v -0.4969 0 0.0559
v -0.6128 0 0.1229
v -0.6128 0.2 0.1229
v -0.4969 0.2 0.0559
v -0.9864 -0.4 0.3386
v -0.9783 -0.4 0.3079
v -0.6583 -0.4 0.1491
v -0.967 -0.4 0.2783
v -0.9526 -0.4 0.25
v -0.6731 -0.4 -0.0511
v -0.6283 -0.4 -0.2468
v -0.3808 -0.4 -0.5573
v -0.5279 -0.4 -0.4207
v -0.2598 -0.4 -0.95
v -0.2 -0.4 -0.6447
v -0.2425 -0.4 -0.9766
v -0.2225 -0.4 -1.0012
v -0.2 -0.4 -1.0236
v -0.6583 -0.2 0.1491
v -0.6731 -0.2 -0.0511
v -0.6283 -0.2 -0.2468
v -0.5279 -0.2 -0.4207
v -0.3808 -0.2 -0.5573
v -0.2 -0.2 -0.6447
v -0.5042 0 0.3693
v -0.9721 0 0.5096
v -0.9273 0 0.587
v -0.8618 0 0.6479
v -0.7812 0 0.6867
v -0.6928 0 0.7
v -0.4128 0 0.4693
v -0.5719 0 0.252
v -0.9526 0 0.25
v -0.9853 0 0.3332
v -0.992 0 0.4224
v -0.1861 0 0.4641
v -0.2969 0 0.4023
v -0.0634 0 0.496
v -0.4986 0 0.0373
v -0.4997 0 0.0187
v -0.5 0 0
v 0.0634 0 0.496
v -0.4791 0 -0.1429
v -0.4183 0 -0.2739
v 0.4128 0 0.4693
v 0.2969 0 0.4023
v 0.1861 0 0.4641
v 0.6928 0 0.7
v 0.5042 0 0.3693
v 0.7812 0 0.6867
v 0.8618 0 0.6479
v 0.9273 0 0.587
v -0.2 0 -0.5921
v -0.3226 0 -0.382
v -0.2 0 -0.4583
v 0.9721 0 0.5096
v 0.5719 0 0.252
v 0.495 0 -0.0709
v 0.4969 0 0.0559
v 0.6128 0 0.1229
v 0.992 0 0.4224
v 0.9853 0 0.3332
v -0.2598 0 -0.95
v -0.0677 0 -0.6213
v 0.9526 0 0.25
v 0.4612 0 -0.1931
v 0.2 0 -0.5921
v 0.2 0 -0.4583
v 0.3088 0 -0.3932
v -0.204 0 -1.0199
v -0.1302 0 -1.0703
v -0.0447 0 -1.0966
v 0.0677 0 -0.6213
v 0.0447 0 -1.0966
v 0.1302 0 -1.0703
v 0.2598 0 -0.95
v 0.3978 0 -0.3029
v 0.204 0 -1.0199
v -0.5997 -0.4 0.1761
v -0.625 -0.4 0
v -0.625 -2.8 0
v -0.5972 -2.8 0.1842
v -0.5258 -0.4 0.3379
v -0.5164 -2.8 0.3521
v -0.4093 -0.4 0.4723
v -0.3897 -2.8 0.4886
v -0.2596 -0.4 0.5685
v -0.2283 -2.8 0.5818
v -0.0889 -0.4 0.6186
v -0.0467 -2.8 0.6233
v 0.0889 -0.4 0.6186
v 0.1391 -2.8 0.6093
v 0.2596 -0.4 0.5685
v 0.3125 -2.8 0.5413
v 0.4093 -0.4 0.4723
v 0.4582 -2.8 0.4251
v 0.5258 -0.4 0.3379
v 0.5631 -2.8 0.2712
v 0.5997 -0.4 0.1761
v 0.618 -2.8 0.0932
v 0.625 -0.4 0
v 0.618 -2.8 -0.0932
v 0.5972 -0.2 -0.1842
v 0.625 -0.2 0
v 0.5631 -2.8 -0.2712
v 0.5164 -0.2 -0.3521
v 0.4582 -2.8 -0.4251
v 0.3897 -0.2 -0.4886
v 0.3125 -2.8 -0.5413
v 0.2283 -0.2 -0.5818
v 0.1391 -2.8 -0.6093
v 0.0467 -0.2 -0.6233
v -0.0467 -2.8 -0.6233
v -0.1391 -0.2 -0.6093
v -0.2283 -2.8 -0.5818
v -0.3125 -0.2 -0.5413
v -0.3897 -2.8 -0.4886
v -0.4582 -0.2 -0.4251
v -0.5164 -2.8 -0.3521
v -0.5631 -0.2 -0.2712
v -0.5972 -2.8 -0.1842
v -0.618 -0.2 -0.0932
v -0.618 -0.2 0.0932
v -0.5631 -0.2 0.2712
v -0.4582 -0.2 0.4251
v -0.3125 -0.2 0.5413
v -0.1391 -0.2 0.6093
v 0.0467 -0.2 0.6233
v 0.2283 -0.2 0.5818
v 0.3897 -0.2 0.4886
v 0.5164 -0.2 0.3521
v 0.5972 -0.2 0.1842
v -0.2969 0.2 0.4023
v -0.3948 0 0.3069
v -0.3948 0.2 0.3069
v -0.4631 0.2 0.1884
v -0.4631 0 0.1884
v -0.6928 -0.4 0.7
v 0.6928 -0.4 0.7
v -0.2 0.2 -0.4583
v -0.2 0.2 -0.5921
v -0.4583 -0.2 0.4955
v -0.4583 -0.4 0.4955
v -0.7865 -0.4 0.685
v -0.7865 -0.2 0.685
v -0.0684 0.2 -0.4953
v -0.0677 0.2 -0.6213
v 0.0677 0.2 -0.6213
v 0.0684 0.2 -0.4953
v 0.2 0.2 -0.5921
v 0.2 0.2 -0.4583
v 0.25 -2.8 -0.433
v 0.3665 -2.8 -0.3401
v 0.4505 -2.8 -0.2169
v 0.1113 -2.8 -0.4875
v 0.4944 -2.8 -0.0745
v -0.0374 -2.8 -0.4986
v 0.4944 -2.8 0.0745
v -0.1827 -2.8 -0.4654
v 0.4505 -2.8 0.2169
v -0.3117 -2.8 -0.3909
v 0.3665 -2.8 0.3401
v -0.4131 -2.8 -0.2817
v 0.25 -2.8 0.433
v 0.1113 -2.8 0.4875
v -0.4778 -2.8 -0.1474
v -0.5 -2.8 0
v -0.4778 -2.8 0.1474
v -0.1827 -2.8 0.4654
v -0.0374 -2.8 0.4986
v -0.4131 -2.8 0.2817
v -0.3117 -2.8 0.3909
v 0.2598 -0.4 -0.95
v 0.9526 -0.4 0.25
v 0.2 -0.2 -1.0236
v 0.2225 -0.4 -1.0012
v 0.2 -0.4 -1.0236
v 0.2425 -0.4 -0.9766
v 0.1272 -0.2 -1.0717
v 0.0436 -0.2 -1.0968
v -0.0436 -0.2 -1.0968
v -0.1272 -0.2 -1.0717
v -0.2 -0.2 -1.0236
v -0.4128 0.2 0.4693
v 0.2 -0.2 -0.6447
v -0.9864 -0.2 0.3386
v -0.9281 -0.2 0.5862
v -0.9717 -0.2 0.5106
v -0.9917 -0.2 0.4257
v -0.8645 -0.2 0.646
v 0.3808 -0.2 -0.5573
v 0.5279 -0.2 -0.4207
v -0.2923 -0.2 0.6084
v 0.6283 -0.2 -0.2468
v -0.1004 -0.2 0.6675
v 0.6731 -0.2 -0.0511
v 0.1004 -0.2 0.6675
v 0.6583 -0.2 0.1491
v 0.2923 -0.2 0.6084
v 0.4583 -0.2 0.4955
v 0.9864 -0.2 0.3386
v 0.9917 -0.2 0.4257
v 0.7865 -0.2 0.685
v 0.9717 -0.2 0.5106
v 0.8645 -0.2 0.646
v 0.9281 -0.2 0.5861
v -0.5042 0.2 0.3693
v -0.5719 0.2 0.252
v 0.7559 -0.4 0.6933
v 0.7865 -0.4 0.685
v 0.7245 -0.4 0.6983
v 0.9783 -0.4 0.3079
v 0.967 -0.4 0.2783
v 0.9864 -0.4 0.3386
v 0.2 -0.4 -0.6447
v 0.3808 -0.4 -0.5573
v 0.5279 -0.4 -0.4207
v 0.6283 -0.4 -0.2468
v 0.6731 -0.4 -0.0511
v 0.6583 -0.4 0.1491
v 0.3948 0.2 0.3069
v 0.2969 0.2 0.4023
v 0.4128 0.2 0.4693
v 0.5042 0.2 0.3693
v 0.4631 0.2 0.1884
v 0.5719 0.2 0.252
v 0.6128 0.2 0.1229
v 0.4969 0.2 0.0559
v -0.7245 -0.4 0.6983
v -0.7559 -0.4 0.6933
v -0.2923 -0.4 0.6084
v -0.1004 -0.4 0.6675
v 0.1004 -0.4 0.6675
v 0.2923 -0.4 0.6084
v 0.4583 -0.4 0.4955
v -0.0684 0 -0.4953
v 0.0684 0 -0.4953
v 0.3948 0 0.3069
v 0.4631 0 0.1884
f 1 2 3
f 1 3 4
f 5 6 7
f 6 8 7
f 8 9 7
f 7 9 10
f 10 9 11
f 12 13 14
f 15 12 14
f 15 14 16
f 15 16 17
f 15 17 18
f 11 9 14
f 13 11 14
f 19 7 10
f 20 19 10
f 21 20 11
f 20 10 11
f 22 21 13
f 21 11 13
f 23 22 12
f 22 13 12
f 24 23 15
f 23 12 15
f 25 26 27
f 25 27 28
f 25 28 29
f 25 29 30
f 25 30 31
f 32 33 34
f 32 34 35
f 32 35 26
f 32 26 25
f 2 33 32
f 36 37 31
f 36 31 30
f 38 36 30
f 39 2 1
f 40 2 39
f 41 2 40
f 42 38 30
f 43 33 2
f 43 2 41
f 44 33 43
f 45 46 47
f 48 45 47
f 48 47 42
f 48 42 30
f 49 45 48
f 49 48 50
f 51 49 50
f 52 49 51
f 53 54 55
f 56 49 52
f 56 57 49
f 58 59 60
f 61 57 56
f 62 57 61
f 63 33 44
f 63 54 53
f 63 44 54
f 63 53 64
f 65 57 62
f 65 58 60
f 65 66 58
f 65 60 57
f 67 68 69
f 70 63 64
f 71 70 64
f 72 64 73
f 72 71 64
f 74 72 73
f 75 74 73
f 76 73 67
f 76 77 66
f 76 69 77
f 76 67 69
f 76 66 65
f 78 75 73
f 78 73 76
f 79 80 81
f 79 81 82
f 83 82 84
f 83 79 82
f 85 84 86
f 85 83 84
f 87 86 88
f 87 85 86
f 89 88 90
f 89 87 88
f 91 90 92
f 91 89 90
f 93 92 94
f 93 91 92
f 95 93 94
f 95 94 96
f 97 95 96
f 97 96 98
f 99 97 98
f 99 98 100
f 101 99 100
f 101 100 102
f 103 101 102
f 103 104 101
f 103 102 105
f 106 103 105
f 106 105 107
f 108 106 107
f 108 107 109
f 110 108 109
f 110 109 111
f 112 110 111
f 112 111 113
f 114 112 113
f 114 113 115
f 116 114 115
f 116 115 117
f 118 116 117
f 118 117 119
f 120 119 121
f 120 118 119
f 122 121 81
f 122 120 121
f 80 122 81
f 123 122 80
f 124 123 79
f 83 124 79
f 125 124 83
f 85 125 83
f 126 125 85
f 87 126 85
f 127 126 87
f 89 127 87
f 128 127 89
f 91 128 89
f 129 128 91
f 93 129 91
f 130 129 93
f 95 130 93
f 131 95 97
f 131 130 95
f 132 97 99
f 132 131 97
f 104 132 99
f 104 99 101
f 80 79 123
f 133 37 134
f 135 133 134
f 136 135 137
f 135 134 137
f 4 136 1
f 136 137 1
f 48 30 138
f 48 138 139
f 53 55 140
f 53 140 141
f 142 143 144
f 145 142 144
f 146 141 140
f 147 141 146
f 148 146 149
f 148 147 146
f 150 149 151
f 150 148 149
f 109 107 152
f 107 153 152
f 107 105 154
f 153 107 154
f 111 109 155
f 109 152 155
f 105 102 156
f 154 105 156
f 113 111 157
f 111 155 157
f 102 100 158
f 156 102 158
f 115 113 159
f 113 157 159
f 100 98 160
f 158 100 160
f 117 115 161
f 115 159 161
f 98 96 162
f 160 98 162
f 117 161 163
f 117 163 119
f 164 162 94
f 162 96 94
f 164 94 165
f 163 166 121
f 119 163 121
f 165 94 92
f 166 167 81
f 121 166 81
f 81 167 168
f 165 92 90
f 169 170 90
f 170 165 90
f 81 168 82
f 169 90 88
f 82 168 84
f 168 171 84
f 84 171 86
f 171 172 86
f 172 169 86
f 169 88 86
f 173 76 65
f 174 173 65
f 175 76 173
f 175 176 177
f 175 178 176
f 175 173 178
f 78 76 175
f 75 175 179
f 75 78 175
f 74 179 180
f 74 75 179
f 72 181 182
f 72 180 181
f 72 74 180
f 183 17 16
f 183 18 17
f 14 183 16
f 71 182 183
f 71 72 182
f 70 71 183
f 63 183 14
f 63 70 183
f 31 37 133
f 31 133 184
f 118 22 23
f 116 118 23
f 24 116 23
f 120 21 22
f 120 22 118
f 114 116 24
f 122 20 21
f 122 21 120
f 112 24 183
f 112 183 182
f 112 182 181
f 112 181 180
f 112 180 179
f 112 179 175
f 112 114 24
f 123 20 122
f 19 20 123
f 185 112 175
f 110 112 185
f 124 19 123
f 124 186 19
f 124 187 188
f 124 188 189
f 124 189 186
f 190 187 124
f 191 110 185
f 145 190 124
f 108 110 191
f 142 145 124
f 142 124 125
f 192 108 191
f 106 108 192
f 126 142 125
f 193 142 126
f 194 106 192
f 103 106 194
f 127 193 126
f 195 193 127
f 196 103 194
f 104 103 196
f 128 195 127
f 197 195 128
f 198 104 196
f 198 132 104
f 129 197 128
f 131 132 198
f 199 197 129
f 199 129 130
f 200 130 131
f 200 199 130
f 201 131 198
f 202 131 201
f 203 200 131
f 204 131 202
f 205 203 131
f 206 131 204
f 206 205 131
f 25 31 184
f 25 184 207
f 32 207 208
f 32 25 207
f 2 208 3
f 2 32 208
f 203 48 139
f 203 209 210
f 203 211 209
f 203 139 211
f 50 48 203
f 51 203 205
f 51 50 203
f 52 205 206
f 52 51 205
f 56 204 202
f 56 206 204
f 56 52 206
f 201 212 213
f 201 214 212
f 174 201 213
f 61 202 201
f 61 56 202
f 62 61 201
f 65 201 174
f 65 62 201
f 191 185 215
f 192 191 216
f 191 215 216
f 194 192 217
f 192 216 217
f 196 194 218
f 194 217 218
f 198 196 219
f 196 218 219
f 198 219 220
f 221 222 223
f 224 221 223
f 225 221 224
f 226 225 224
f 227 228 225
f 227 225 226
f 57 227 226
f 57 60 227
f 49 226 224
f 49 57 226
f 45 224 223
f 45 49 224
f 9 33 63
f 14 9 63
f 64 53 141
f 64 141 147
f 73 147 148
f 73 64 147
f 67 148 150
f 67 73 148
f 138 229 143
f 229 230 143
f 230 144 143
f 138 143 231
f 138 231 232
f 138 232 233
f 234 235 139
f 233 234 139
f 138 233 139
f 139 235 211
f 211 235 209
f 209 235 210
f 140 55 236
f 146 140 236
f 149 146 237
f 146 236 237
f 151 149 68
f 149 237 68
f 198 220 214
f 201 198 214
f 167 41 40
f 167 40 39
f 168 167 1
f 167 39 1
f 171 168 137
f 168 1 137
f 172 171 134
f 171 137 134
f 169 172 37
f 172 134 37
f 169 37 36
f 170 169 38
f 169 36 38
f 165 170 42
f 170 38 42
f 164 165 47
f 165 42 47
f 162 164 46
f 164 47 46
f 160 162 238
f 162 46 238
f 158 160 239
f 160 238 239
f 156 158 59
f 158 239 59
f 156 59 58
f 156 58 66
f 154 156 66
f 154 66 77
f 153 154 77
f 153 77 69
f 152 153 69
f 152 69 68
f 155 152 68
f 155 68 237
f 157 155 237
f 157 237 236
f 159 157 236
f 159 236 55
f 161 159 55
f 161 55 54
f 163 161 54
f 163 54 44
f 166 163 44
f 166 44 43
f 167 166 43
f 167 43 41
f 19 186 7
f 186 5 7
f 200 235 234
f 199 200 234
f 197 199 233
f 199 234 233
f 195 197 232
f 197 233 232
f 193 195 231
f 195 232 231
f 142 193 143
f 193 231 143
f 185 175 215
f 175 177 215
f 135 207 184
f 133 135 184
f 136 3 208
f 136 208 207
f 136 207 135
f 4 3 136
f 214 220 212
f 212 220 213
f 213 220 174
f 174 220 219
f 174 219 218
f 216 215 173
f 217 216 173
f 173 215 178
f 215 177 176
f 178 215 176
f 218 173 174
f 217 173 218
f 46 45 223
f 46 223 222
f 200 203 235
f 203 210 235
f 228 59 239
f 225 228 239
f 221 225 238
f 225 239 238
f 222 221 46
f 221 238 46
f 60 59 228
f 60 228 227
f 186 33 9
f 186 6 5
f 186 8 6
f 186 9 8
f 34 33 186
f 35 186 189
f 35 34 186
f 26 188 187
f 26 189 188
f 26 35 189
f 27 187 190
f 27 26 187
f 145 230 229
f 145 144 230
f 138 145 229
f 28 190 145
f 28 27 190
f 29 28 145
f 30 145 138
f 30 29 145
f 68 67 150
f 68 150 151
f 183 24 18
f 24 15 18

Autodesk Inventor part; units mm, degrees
ref_plane "YZ Plane" through (0, 0, 0) normal (1, 0, 0) x (0, 1, 0)
ref_plane "XZ Plane" through (0, 0, 0) normal (0, 1, 0) x (-1, 0, 0)
ref_plane "XY Plane" through (0, 0, 0) normal (0, 0, 1) x (1, 0, 0)
sketch "Esboço1" plane through (0, 0, 0) normal (0, 1, 0) x (-1, 0, 0)
  circle A0 centre (0, 0) radius 0.625
  circle A1 centre (0, 0) radius 0.5
  dimension "d0" = 1.25
  dimension "d1" = 1
extrude "Extrusão1" add sketch "Esboço1" against normal blind 2.8
sketch "Esboço2" plane through (0, 0, 0) normal (0, 1, 0) x (1, 0, 0)
  line L0 (0, 0) -> (0, 1.4)
  line L1 (0, 0) -> (0, -1.4)
  line L2 (0, 0) -> (-1.2124, -0.7)
  line L3 (0, 0) -> (1.2124, -0.7)
  line L4 (0.2598, 0.95) -> (0.9526, -0.25)
  line L5 (-0.9526, -0.25) -> (-0.2598, 0.95)
  line L6 (-0.6928, -0.7) -> (0.6928, -0.7)
  arc A0 (-0.9526, -0.25) -> (-0.6928, -0.7) centre (-0.6928, -0.4) ccw
  arc A1 (0.6928, -0.7) -> (0.9526, -0.25) centre (0.6928, -0.4) ccw
  arc A2 (0.2598, 0.95) -> (-0.2598, 0.95) centre (0, 0.8) ccw
  circle A3 centre (0, 0) radius 0.625 projected
  circle A4 centre (0, 0) radius 0.5 projected
  dimension "d5" = 1.4
  dimension "d6" = 1.4
  dimension "d9" = 360
  dimension "d11" = 0.3
extrude "Extrusão2" add sketch "Esboço2" against normal blind 0.4 contours A3 L2 A0 L5 A2 L0 | L0 A2 L4 A1 L3 A3 | A3 L3 A1 L6 L1 | L1 L6 A0 L2 A3
sketch "Esboço3" plane through (0, -0.4, 0) normal (0, -1, 0) x (1, 0, 0)
  line L0 (0.2, 0) -> (-0.2, 0)
  line L1 (-0.2, 0) -> (-0.2, -1.1589)
  line L2 (-0.2, -1.1589) -> (0.2, -1.1589)
  line L3 (0.2, -1.1589) -> (0.2, 0)
  line L4 (-0.1, 0.1732) -> (0.1, -0.1732)
  line L5 (0.1, -0.1732) -> (1.1036, 0.4062)
  line L6 (1.1036, 0.4062) -> (0.9036, 0.7526)
  line L7 (0.9036, 0.7526) -> (-0.1, 0.1732)
  line L8 (-0.1, -0.1732) -> (0.1, 0.1732)
  line L9 (0.1, 0.1732) -> (-0.9036, 0.7526)
  line L10 (-0.9036, 0.7526) -> (-1.1036, 0.4062)
  line L11 (-1.1036, 0.4062) -> (-0.1, -0.1732)
  arc A0 (0.9526, 0.25) -> (0.6928, 0.7) centre (0.6928, 0.4) ccw projected
  line L12 (0.6928, 0.7) -> (-0.6928, 0.7) projected
  arc A1 (-0.6928, 0.7) -> (-0.9526, 0.25) centre (-0.6928, 0.4) ccw projected
  line L13 (-0.9526, 0.25) -> (-0.2598, -0.95) projected
  arc A2 (-0.2598, -0.95) -> (0.2598, -0.95) centre (0, -0.8) ccw projected
  line L14 (0.2598, -0.95) -> (0.9526, 0.25) projected
  circle A3 centre (0, 0) radius 0.625 projected
  circle A4 centre (0, 0) radius 0.625 projected
  circle A5 centre (0, 0) radius 0.5 projected
  circle A6 centre (0, 0) radius 0.625 projected
  circle A7 centre (0, 0) radius 0.675
  point P0 (0.2, -0.6447)
  point P1 (0.6583, 0.1491)
  point P2 (0.9865, 0.3386)
  point P3 (0.7865, 0.685)
  point P4 (0.4583, 0.4956)
  point P5 (-0.4583, 0.4956)
  point P6 (-0.7865, 0.685)
  point P7 (-0.9865, 0.3386)
  point P8 (-0.6583, 0.1491)
  point P9 (-0.2, -0.6447)
  point P10 (-0.2, -1.0236)
  point P11 (0.2, -1.0236)
  dimension "d14" = 0.4
  dimension "d17" = 360
  dimension "d20" = 1.35
extrude "Extrusão3" cut sketch "Esboço3" against normal blind 0.2 contours A3 L5 A7 L3 | L3 A7 L1 A3 | A3 L7 A7 L5 | L3 A2 L1 A7 | L1 A7 L11 A3 | A7 L7 A0 L5 | A3 L9 A7 L7 | L11 A7 L9 A3 | L11 A1 L9 A7
sketch "Esboço4" plane through (0, 0, 0) normal (0, 1, 0) x (1, 0, 0)
  circle A0 centre (0, 0) radius 0.6
  line L0 (0.9865, -0.3386) -> (0.6583, -0.1491) projected
  arc A1 (0.7865, -0.685) -> (0.9865, -0.3386) centre (0.6928, -0.4) ccw projected
  line L1 (0.4583, -0.4956) -> (0.7865, -0.685) projected
  arc A2 (-0.4583, -0.4956) -> (0.4583, -0.4956) centre (0, 0) ccw projected
  line L2 (-0.7865, -0.685) -> (-0.4583, -0.4956) projected
  arc A3 (-0.9865, -0.3386) -> (-0.7865, -0.685) centre (-0.6928, -0.4) ccw projected
  line L3 (-0.6583, -0.1491) -> (-0.9865, -0.3386) projected
  arc A4 (-0.2, 0.6447) -> (-0.6583, -0.1491) centre (0, 0) ccw projected
  line L4 (-0.2, 1.0236) -> (-0.2, 0.6447) projected
  arc A5 (0.2, 1.0236) -> (-0.2, 1.0236) centre (0, 0.8) ccw projected
  line L5 (0.2, 0.6447) -> (0.2, 1.0236) projected
  arc A6 (0.6583, -0.1491) -> (0.2, 0.6447) centre (0, 0) ccw projected
  circle A7 centre (0, 0) radius 0.625 projected
  line L6 (0.9036, -0.7526) -> (-0.1, -0.1732) projected
  line L7 (0.1, 0.1732) -> (1.1036, -0.4062) projected
  line L8 (0.1, -0.1732) -> (-0.9036, -0.7526) projected
  line L9 (-1.1036, -0.4062) -> (-0.1, 0.1732) projected
  line L10 (-0.2, 0) -> (-0.2, 1.1589) projected
  line L11 (0.2, 1.1589) -> (0.2, 0) projected
  circle A8 centre (0, 0) radius 0.5
  point P0 (-0.2, 0.4583)
  point P1 (0.2, 0.4583)
  point P2 (0.2, 0.5921)
  point P3 (-0.2, 0.5921)
  point P4 (0.4969, -0.0559)
  point P5 (0.2969, -0.4023)
  point P6 (0.4128, -0.4693)
  point P7 (0.6128, -0.1229)
  point P8 (-0.2969, -0.4023)
  point P9 (-0.4969, -0.0559)
  point P10 (-0.6128, -0.1229)
  point P11 (-0.4128, -0.4693)
  dimension "d23" = 1.2
  dimension "d24" = 1
extrude "Extrusão4" add sketch "Esboço4" along normal blind 0.2 contours L11 A8 L10 A0 | A0 L10 A7 L11 | L7 A7 L6 A0 | A0 L6 A8 L7 | L9 A8 L8 A0 | A0 L8 A7 L9
properties part number "Suporte Contato"
